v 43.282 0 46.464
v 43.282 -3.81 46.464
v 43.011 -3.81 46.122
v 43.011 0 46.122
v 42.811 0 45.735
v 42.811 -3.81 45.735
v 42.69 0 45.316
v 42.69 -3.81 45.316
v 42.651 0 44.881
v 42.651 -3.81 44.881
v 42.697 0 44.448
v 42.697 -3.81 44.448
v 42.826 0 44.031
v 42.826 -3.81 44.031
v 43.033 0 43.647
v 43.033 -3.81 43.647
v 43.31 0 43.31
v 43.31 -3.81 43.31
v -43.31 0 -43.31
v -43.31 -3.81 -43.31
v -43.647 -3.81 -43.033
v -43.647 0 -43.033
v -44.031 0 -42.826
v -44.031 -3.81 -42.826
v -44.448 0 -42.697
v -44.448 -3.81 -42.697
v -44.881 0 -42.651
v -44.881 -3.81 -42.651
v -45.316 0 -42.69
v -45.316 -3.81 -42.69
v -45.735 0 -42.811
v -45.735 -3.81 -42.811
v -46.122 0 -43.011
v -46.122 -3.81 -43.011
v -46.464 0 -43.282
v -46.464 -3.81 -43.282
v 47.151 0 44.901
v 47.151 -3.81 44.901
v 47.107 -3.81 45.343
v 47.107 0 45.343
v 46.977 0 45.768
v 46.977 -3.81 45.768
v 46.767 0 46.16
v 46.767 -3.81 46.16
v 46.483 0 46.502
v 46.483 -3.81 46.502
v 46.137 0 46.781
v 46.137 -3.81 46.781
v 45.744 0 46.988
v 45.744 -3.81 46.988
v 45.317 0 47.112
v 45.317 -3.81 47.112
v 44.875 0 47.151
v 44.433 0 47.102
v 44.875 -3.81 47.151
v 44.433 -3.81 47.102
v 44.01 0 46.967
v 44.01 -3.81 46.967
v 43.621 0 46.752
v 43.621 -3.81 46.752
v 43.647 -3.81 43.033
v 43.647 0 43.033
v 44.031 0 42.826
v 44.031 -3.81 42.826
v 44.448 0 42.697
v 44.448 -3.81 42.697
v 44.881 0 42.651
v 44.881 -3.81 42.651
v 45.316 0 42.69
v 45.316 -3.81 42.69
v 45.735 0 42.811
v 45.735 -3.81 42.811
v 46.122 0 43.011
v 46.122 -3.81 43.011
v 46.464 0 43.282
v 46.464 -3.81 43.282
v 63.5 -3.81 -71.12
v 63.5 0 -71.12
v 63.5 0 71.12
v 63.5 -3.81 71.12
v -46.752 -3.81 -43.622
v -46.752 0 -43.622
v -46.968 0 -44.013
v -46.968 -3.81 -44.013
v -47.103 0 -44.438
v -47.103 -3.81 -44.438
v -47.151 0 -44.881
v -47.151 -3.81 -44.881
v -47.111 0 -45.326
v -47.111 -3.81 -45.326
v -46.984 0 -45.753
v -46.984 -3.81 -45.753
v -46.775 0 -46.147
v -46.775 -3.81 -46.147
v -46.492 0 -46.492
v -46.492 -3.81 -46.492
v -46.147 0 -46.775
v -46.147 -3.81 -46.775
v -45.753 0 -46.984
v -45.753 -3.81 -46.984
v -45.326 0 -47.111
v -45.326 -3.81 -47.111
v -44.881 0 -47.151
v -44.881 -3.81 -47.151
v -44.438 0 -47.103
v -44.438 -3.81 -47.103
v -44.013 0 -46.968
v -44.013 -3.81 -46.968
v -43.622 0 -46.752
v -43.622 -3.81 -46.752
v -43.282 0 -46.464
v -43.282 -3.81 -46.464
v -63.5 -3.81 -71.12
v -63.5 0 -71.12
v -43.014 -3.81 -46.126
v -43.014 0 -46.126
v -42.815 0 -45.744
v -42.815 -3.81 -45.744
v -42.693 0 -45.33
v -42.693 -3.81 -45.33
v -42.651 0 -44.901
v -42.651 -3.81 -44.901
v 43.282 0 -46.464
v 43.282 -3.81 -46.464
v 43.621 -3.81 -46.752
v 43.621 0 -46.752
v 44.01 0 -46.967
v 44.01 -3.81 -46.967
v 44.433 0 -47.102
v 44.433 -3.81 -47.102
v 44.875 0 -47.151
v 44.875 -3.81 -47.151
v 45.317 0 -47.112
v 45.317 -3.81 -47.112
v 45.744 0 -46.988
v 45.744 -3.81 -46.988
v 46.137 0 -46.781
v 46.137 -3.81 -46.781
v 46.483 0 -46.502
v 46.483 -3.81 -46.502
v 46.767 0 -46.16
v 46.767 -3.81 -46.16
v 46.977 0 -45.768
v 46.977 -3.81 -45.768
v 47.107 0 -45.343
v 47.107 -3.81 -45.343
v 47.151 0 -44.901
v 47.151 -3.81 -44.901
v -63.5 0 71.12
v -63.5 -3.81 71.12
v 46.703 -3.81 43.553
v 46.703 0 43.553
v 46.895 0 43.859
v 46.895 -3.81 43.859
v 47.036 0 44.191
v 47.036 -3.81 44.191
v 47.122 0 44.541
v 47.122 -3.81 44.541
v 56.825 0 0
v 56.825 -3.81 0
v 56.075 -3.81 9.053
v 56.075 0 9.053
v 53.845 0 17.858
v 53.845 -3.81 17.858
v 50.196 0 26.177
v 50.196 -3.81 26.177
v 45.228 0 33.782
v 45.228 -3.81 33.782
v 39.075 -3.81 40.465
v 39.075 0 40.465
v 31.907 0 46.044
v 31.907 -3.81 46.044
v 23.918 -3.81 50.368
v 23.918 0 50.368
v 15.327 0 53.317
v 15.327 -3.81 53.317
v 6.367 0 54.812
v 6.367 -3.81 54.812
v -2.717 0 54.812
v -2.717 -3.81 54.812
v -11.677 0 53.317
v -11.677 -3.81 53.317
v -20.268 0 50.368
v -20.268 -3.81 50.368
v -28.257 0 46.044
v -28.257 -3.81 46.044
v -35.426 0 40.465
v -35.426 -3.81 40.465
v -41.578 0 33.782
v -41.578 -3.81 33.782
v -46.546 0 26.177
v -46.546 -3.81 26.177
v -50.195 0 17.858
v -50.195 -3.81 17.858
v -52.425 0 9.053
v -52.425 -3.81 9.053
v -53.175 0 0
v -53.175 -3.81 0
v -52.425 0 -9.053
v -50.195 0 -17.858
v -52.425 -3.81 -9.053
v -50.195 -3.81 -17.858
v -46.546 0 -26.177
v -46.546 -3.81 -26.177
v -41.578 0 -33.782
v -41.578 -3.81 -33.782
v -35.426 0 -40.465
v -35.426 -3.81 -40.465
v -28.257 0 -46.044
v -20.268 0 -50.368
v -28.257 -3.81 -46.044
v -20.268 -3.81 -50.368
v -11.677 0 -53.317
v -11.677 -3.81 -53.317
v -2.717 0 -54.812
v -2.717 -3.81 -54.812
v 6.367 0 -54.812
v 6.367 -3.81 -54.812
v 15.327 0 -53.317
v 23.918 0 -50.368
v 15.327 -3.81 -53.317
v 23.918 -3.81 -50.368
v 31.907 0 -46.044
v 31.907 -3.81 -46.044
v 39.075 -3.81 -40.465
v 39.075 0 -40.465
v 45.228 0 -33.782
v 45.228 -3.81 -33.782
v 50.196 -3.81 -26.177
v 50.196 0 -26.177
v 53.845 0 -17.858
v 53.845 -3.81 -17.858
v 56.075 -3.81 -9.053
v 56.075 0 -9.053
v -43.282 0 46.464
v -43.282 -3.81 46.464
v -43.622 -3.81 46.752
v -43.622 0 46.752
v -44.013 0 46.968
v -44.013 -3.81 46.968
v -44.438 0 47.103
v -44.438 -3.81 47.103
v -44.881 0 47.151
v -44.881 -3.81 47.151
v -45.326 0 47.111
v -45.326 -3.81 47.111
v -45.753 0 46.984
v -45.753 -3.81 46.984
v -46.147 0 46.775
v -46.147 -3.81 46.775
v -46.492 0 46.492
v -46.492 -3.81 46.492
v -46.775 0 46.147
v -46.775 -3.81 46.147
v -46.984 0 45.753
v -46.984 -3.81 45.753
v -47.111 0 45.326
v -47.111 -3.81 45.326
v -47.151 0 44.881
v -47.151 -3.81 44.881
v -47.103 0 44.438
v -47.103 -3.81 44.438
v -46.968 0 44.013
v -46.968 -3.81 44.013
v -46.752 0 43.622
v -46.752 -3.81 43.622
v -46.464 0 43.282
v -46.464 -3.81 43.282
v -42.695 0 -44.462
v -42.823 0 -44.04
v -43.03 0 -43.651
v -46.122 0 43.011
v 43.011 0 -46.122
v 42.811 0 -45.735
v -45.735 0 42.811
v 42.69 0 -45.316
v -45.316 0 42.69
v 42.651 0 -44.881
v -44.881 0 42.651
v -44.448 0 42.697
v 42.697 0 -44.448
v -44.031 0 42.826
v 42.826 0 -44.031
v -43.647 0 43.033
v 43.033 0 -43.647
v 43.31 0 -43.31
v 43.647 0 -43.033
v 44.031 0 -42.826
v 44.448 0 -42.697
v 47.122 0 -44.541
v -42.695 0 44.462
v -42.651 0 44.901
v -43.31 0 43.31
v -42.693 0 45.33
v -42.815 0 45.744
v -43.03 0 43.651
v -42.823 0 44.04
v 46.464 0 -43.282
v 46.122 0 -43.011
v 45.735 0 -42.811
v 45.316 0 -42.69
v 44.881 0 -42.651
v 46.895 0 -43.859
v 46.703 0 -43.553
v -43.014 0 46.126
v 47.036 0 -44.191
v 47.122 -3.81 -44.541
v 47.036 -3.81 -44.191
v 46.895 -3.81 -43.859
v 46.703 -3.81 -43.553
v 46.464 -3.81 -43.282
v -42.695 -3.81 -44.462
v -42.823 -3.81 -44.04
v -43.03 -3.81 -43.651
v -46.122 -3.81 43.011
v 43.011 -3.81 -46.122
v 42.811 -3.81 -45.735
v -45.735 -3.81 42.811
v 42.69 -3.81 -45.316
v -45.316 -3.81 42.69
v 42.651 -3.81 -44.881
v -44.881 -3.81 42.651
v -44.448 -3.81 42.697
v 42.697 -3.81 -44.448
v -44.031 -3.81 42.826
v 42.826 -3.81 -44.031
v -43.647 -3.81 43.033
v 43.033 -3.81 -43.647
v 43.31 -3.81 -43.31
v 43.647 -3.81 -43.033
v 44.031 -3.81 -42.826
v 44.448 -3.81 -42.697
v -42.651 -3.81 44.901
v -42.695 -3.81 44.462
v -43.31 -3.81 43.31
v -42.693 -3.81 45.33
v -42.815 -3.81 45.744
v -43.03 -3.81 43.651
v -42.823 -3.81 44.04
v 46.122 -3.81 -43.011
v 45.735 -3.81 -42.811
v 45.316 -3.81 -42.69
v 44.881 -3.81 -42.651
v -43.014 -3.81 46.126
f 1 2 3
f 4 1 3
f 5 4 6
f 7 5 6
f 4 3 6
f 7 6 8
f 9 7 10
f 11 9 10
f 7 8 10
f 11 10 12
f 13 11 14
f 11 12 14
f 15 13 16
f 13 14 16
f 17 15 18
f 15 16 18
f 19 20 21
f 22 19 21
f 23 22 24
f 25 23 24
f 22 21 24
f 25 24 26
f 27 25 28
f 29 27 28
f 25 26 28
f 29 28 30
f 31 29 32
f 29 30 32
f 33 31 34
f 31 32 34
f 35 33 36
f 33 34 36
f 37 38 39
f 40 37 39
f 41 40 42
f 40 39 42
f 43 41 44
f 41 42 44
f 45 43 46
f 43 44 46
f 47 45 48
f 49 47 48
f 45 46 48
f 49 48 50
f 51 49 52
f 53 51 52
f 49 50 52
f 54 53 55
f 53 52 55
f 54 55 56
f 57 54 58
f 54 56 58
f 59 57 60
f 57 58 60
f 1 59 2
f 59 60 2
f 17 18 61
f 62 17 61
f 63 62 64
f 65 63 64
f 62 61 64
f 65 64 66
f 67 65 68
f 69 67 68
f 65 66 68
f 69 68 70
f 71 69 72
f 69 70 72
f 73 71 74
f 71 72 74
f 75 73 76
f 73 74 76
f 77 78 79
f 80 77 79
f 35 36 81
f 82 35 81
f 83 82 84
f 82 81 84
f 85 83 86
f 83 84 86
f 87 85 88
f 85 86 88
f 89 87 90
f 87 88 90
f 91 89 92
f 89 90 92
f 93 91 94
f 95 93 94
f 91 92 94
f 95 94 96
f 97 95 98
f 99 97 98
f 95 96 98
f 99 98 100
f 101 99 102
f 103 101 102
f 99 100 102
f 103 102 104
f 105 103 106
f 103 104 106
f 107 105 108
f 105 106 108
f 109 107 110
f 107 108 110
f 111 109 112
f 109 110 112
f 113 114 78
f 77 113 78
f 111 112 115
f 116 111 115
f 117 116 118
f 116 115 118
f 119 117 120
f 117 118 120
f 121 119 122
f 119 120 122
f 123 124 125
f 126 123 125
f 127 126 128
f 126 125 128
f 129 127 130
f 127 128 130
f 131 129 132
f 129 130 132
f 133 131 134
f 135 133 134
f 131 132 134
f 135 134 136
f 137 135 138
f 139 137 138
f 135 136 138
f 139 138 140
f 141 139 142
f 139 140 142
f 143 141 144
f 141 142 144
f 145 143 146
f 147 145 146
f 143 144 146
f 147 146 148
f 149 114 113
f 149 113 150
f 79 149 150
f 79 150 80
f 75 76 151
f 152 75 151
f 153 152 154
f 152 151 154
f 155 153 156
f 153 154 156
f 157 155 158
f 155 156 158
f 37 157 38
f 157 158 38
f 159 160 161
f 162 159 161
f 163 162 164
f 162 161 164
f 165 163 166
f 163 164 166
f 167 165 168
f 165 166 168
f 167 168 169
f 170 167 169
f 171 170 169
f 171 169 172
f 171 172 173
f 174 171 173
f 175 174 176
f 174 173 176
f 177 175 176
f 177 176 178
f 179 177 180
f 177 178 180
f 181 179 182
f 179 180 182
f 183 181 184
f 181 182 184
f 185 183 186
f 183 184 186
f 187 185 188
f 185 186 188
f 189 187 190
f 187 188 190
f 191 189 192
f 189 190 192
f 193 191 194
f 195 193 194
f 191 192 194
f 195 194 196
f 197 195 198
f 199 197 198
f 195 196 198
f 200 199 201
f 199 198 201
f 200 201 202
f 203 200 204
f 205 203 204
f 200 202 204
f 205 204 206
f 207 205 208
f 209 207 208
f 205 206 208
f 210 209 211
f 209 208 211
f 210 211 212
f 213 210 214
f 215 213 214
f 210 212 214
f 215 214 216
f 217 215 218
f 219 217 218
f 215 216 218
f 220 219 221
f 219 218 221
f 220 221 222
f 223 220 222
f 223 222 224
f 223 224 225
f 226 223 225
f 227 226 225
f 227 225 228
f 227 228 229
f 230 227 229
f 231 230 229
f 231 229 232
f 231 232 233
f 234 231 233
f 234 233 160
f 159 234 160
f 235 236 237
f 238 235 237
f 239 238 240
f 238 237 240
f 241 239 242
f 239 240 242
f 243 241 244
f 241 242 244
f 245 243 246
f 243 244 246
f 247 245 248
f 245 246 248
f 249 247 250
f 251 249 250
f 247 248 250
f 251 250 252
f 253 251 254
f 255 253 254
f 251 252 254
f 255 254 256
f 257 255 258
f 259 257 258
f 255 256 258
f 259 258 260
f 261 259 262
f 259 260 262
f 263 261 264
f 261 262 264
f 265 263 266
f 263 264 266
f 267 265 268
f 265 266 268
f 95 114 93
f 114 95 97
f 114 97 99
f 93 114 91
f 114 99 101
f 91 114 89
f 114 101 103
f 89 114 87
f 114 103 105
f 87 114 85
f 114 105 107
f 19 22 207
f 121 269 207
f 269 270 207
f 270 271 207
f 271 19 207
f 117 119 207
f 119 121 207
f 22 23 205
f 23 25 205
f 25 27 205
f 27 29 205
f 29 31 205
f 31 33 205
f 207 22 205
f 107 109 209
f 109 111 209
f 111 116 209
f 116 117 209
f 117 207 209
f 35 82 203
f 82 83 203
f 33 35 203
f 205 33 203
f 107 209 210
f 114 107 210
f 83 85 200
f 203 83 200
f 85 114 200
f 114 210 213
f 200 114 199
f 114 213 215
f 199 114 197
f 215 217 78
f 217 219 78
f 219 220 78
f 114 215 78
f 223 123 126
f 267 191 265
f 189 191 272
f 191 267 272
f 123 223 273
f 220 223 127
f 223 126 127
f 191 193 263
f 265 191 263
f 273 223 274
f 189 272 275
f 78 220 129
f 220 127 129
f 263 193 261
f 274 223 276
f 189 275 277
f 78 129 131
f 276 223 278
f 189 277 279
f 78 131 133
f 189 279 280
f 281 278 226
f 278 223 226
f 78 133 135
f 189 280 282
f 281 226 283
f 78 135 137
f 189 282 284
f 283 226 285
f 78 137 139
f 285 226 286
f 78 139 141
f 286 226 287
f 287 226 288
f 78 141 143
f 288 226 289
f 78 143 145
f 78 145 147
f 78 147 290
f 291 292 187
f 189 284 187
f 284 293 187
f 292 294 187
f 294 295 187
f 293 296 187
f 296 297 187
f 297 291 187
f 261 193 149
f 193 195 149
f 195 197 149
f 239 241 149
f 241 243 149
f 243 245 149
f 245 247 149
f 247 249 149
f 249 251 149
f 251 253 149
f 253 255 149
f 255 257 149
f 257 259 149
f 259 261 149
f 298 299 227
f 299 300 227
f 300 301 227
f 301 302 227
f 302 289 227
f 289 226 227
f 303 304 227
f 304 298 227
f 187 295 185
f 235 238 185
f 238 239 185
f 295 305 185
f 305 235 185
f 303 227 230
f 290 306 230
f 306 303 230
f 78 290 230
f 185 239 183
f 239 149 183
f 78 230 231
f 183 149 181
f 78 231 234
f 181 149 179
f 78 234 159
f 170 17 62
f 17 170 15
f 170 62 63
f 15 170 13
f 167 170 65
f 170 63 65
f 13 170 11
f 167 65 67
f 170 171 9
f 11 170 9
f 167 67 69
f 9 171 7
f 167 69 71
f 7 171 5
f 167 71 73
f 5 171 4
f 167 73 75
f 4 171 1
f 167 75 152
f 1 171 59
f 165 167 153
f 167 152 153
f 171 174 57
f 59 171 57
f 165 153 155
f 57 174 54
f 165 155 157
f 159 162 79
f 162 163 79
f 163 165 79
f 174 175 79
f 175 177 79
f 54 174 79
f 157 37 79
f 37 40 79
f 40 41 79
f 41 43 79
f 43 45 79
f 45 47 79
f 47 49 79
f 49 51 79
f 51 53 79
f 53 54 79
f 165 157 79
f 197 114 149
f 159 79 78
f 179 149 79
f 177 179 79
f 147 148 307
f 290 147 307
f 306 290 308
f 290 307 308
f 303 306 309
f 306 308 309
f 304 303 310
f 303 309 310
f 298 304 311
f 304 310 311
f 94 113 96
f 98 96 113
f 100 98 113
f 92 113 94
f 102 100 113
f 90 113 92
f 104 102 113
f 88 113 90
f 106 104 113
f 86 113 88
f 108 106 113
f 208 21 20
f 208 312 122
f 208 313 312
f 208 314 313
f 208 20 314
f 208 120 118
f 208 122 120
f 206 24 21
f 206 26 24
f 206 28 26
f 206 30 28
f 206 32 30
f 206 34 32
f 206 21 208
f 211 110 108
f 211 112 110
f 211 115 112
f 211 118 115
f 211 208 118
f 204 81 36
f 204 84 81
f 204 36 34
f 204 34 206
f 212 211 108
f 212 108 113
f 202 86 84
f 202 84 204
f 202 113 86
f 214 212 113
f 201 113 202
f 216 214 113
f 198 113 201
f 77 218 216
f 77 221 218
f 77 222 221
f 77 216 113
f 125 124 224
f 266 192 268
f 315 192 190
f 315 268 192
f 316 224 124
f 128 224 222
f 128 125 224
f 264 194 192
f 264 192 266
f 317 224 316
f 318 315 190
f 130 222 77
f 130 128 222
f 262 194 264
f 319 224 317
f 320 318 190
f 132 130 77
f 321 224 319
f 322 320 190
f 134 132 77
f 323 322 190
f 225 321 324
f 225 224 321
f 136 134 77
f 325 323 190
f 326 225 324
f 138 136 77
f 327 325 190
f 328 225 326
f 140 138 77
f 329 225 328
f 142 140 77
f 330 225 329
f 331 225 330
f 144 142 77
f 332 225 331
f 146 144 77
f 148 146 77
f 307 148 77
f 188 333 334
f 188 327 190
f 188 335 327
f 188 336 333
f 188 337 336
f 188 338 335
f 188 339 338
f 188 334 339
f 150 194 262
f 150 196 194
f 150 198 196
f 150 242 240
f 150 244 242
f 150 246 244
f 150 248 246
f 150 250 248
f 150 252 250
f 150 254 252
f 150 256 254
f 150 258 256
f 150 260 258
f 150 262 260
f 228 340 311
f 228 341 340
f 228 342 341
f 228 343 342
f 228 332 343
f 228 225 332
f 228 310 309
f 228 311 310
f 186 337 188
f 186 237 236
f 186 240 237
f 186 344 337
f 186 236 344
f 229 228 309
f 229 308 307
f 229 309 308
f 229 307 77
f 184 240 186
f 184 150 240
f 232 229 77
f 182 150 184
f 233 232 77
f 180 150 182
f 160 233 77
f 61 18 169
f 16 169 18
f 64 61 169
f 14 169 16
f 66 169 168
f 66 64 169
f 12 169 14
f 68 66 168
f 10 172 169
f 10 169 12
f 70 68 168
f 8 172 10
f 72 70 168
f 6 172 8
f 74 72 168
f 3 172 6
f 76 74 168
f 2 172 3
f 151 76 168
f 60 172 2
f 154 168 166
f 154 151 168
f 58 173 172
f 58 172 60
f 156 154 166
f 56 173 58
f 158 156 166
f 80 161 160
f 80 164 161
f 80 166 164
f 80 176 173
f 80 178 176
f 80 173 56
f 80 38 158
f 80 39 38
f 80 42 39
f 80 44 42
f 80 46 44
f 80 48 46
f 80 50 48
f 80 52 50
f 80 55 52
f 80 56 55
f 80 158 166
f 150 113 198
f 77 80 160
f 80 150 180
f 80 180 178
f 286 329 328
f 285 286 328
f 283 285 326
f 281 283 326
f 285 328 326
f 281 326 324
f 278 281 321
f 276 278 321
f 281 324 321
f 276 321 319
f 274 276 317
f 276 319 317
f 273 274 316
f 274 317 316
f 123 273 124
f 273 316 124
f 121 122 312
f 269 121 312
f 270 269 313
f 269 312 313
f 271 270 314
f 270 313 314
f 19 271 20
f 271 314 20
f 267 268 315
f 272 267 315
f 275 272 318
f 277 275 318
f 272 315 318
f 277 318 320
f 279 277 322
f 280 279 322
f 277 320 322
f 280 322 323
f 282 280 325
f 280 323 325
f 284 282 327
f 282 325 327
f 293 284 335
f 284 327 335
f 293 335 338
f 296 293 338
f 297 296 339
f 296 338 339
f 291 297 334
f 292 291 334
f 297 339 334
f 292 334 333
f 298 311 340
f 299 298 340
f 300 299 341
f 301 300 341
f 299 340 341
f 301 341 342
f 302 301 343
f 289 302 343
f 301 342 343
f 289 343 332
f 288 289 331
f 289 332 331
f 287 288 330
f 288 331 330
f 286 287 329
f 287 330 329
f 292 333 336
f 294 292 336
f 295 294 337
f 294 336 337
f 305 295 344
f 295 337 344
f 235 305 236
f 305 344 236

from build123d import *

# Parameters (mm, degrees)
F0_W     = 127
F0_H     = 142.24
F1_DEPTH = 3.81
F2_R     = 55
F3_DEPTH = 3.81
F5_DEPTH = 3.81


with BuildPart() as f1:
    # F0 (on Front) → F1 (new body)
    with BuildSketch(Plane.XZ):
        Rectangle(F0_W, F0_H)
    extrude(amount=F1_DEPTH)

    # F2 (on face) → F3 (cut, through all)
    with BuildSketch(Plane.XZ.offset(3.81)):
        with Locations((1.824845, 0)):
            Circle(F2_R)
    extrude(amount=-F3_DEPTH, mode=Mode.SUBTRACT)

    # F4 (on face) → F5 (cut, through all)
    with BuildSketch(Plane.XZ.offset(3.81)):
        with BuildLine():
            ThreePointArc((-46.463834, 43.282353), (-44.881349, 42.651369), (-43.31029, 43.31029))
            Line((-43.31029, 43.31029), (-44.901281, 44.901281))
            ThreePointArc((-44.901281, 44.901281), (-45.689728, 44.098738), (-46.463834, 43.282353))
        make_face()
        with BuildLine():
            ThreePointArc((-44.901281, 44.901281), (-44.098738, 45.689728), (-43.282353, 46.463834))
            ThreePointArc((-43.282353, 46.463834), (-46.492271, 46.492271), (-46.463834, 43.282353))
            ThreePointArc((-46.463834, 43.282353), (-45.689728, 44.098738), (-44.901281, 44.901281))
        make_face()
        with BuildLine():
            ThreePointArc((-42.651281, 44.901281), (-42.815006, 45.74387), (-43.282353, 46.463834))
            ThreePointArc((-43.282353, 46.463834), (-44.098738, 45.689728), (-44.901281, 44.901281))
            Line((-44.901281, 44.901281), (-43.31029, 43.31029))
            ThreePointArc((-43.31029, 43.31029), (-42.822552, 44.040243), (-42.651281, 44.901281))
        make_face()
        with BuildLine():
            ThreePointArc((44.901281, 44.901281), (45.689728, 44.098738), (46.463834, 43.282353))
            ThreePointArc((46.463834, 43.282353), (46.9723, 44.021862), (47.151281, 44.901281))
            ThreePointArc((47.151281, 44.901281), (45.74387, 46.987556), (43.282353, 46.463834))
            ThreePointArc((43.282353, 46.463834), (44.098738, 45.689728), (44.901281, 44.901281))
        make_face()
        with BuildLine():
            ThreePointArc((43.31029, 43.31029), (44.881349, 42.651369), (46.463834, 43.282353))
            ThreePointArc((46.463834, 43.282353), (45.689728, 44.098738), (44.901281, 44.901281))
            Line((44.901281, 44.901281), (43.31029, 43.31029))
        make_face()
        with BuildLine():
            Line((43.31029, 43.31029), (44.901281, 44.901281))
            ThreePointArc((44.901281, 44.901281), (44.098738, 45.689728), (43.282353, 46.463834))
            ThreePointArc((43.282353, 46.463834), (42.651369, 44.881349), (43.31029, 43.31029))
        make_face()
        with BuildLine():
            ThreePointArc((44.901281, -44.901281), (45.689728, -44.098738), (46.463834, -43.282353))
            ThreePointArc((46.463834, -43.282353), (44.881349, -42.651369), (43.31029, -43.31029))
            Line((43.31029, -43.31029), (44.901281, -44.901281))
        make_face()
        with BuildLine():
            ThreePointArc((43.282353, -46.463834), (44.098738, -45.689728), (44.901281, -44.901281))
            Line((44.901281, -44.901281), (43.31029, -43.31029))
            ThreePointArc((43.31029, -43.31029), (42.651369, -44.881349), (43.282353, -46.463834))
        make_face()
        with BuildLine():
            ThreePointArc((47.151281, -44.901281), (46.9723, -44.021862), (46.463834, -43.282353))
            ThreePointArc((46.463834, -43.282353), (45.689728, -44.098738), (44.901281, -44.901281))
            ThreePointArc((44.901281, -44.901281), (44.098738, -45.689728), (43.282353, -46.463834))
            ThreePointArc((43.282353, -46.463834), (45.74387, -46.987556), (47.151281, -44.901281))
        make_face()
        with BuildLine():
            ThreePointArc((-46.463834, -43.282353), (-46.492271, -46.492271), (-43.282353, -46.463834))
            ThreePointArc((-43.282353, -46.463834), (-44.098738, -45.689728), (-44.901281, -44.901281))
            ThreePointArc((-44.901281, -44.901281), (-45.689728, -44.098738), (-46.463834, -43.282353))
        make_face()
        with BuildLine():
            Line((-44.901281, -44.901281), (-43.31029, -43.31029))
            ThreePointArc((-43.31029, -43.31029), (-44.881349, -42.651369), (-46.463834, -43.282353))
            ThreePointArc((-46.463834, -43.282353), (-45.689728, -44.098738), (-44.901281, -44.901281))
        make_face()
        with BuildLine():
            ThreePointArc((-42.651281, -44.901281), (-42.822552, -44.040243), (-43.31029, -43.31029))
            Line((-43.31029, -43.31029), (-44.901281, -44.901281))
            ThreePointArc((-44.901281, -44.901281), (-44.098738, -45.689728), (-43.282353, -46.463834))
            ThreePointArc((-43.282353, -46.463834), (-42.815006, -45.74387), (-42.651281, -44.901281))
        make_face()
    extrude(amount=-F5_DEPTH, mode=Mode.SUBTRACT)


solid = f1.part
